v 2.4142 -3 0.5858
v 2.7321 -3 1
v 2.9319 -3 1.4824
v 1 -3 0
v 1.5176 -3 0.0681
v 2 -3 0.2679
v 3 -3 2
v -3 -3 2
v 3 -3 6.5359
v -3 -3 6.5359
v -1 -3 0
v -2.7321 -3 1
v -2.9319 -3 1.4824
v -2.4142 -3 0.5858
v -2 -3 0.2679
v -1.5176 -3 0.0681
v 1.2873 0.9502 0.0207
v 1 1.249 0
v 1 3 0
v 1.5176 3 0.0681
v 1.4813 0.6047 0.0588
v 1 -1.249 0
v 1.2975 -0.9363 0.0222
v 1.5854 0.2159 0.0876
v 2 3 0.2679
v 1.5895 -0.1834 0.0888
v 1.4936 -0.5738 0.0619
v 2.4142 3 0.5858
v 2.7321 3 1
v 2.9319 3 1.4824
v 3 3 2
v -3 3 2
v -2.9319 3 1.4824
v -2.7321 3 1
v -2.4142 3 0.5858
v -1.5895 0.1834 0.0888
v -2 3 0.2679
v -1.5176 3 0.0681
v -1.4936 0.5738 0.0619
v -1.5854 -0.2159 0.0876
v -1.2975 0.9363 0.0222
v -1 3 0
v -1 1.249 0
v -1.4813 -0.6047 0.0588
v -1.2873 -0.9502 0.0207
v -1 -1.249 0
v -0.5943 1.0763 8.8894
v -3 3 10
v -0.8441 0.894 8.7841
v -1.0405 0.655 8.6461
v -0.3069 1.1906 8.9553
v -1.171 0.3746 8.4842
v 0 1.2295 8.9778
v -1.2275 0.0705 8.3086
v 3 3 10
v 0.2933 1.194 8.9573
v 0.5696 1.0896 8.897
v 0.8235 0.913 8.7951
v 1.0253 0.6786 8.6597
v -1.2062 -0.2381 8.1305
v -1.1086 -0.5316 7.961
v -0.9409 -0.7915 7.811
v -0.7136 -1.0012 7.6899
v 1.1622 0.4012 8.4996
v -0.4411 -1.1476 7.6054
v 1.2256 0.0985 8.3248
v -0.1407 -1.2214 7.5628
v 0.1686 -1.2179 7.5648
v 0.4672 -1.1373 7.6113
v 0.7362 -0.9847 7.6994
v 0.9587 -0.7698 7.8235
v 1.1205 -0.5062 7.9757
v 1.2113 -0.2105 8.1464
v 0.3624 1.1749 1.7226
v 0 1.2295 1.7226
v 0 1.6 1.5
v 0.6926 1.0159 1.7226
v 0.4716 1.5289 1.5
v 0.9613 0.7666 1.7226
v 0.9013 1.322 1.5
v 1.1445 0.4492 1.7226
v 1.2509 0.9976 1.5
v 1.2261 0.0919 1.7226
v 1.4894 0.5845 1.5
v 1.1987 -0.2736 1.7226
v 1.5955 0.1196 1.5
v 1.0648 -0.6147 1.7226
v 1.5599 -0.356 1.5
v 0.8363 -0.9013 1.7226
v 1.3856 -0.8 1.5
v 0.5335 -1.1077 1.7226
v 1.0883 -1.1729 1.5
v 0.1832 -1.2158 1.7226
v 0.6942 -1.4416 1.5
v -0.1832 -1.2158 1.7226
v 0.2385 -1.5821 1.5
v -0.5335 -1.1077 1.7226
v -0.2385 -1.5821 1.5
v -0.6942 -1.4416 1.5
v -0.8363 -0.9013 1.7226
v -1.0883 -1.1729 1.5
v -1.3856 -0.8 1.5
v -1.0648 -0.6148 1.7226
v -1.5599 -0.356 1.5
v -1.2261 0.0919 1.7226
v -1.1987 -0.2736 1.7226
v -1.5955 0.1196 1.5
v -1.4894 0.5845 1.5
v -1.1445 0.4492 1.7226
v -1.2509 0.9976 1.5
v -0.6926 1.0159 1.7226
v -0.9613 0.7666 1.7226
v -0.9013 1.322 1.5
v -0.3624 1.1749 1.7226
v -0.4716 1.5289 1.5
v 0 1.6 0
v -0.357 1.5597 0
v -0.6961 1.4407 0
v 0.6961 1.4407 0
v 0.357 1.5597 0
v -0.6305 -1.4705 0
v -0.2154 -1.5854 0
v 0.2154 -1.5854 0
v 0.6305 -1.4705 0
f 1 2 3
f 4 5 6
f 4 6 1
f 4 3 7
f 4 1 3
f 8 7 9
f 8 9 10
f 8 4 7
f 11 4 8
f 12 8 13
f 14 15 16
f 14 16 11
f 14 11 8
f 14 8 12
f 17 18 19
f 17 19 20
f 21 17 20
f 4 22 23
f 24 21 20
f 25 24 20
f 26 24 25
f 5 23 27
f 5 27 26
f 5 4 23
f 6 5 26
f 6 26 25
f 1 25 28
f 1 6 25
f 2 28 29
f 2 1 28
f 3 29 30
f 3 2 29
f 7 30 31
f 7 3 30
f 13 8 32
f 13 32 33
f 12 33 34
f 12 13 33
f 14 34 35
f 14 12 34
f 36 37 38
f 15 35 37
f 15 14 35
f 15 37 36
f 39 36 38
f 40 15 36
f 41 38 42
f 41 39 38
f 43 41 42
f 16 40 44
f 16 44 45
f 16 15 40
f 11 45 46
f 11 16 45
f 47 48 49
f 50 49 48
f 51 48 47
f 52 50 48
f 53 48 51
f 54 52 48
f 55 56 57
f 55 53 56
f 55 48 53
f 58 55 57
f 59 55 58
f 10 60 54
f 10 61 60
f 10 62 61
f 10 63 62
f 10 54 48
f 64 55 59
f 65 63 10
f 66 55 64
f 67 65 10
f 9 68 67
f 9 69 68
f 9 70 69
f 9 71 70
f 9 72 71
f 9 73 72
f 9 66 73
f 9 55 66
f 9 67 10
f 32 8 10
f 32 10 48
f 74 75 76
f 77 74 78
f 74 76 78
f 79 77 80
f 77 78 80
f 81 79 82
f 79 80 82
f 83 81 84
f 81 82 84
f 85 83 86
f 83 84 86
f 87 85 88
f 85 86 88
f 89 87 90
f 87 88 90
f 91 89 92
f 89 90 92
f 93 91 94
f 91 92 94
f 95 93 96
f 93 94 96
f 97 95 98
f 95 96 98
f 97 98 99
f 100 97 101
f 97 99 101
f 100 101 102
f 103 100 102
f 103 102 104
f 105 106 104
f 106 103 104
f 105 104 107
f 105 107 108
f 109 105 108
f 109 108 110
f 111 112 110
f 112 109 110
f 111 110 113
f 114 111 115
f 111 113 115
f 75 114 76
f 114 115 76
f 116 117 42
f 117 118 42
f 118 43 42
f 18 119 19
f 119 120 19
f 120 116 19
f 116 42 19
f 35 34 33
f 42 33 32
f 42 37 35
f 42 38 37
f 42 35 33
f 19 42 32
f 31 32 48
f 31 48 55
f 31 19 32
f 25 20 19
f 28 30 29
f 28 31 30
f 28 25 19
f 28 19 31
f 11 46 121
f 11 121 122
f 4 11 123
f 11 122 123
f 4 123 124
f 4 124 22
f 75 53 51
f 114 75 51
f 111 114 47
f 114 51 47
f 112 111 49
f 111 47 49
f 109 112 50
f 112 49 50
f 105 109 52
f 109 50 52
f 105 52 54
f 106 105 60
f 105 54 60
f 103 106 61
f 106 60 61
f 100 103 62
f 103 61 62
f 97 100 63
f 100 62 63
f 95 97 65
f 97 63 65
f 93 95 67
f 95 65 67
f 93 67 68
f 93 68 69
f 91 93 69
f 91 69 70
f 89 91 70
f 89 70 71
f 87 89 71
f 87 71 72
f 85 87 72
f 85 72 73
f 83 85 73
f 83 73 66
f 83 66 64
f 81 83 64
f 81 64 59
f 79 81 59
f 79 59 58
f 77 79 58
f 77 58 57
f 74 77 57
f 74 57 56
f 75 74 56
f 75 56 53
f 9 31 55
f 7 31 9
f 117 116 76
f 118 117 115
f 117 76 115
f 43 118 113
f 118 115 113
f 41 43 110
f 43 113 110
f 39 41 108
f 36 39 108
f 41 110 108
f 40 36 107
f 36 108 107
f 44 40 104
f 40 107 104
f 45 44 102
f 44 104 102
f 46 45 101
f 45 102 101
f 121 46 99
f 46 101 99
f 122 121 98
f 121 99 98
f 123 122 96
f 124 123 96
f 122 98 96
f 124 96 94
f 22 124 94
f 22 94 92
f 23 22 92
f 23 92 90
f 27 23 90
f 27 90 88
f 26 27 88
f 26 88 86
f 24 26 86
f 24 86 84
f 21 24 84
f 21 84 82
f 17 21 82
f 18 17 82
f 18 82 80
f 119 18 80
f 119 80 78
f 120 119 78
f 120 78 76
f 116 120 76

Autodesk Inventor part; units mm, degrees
ref_plane "YZ Plane" through (0, 0, 0) normal (1, 0, 0) x (0, 1, 0)
ref_plane "XZ Plane" through (0, 0, 0) normal (0, 1, 0) x (-1, 0, 0)
ref_plane "XY Plane" through (0, 0, 0) normal (0, 0, 1) x (1, 0, 0)
sketch "Skizze1" plane through (0, 0, 0) normal (0, 0, 1) x (1, 0, 0)
  line L0 (-4.2, 0) -> (4.2, 0) projected
  line L1 (0, -4.2) -> (0, 4.2) projected
  line L2 (-3, 3) -> (3, 3)
  line L3 (3, 3) -> (3, -3)
  line L4 (3, -3) -> (-3, -3)
  line L5 (-3, -3) -> (-3, 3)
  point P0 (0, 0)
  dimension "d0" = 6
  dimension "d1" = 6
extrude "Extrusion1" add sketch "Skizze1" along normal blind 10
sketch "Skizze2" plane through (3, -3, 0) normal (1, 0, 0) x (0, 0, -1)
  line L0 (-10, 0) -> (-10, 6) projected
  line L1 (0, 0) -> (-10, 0) projected
  line L2 (-10, 6) -> (-6.5359, 0)
  point P0 (0, 3)
  dimension "d4" = 60
extrude "Extrusion2" cut sketch "Skizze2" against normal through all
fillet "Rundung1" radius 2 2 edges at (3, 0, 0) (-3, 0, 0)
sketch "Skizze3" plane through (0, 0, 0) normal (0, 0, -1) x (-1, 0, 0)
  point P0 (0, 0)
  point P1 (0, 0)
hole "Bohrung1" at (0, 0, 0) direction (0, 0, 1) diameter 2.459 end through all thread size "M3x0.5" class "6H" standard "ISO Metric profile"
hole "Bohrung2" at (0, 0, 0) direction (0, 0, 1) diameter 3.2 depth 1.5 tip angle 118
properties part number "13_1087_034"
